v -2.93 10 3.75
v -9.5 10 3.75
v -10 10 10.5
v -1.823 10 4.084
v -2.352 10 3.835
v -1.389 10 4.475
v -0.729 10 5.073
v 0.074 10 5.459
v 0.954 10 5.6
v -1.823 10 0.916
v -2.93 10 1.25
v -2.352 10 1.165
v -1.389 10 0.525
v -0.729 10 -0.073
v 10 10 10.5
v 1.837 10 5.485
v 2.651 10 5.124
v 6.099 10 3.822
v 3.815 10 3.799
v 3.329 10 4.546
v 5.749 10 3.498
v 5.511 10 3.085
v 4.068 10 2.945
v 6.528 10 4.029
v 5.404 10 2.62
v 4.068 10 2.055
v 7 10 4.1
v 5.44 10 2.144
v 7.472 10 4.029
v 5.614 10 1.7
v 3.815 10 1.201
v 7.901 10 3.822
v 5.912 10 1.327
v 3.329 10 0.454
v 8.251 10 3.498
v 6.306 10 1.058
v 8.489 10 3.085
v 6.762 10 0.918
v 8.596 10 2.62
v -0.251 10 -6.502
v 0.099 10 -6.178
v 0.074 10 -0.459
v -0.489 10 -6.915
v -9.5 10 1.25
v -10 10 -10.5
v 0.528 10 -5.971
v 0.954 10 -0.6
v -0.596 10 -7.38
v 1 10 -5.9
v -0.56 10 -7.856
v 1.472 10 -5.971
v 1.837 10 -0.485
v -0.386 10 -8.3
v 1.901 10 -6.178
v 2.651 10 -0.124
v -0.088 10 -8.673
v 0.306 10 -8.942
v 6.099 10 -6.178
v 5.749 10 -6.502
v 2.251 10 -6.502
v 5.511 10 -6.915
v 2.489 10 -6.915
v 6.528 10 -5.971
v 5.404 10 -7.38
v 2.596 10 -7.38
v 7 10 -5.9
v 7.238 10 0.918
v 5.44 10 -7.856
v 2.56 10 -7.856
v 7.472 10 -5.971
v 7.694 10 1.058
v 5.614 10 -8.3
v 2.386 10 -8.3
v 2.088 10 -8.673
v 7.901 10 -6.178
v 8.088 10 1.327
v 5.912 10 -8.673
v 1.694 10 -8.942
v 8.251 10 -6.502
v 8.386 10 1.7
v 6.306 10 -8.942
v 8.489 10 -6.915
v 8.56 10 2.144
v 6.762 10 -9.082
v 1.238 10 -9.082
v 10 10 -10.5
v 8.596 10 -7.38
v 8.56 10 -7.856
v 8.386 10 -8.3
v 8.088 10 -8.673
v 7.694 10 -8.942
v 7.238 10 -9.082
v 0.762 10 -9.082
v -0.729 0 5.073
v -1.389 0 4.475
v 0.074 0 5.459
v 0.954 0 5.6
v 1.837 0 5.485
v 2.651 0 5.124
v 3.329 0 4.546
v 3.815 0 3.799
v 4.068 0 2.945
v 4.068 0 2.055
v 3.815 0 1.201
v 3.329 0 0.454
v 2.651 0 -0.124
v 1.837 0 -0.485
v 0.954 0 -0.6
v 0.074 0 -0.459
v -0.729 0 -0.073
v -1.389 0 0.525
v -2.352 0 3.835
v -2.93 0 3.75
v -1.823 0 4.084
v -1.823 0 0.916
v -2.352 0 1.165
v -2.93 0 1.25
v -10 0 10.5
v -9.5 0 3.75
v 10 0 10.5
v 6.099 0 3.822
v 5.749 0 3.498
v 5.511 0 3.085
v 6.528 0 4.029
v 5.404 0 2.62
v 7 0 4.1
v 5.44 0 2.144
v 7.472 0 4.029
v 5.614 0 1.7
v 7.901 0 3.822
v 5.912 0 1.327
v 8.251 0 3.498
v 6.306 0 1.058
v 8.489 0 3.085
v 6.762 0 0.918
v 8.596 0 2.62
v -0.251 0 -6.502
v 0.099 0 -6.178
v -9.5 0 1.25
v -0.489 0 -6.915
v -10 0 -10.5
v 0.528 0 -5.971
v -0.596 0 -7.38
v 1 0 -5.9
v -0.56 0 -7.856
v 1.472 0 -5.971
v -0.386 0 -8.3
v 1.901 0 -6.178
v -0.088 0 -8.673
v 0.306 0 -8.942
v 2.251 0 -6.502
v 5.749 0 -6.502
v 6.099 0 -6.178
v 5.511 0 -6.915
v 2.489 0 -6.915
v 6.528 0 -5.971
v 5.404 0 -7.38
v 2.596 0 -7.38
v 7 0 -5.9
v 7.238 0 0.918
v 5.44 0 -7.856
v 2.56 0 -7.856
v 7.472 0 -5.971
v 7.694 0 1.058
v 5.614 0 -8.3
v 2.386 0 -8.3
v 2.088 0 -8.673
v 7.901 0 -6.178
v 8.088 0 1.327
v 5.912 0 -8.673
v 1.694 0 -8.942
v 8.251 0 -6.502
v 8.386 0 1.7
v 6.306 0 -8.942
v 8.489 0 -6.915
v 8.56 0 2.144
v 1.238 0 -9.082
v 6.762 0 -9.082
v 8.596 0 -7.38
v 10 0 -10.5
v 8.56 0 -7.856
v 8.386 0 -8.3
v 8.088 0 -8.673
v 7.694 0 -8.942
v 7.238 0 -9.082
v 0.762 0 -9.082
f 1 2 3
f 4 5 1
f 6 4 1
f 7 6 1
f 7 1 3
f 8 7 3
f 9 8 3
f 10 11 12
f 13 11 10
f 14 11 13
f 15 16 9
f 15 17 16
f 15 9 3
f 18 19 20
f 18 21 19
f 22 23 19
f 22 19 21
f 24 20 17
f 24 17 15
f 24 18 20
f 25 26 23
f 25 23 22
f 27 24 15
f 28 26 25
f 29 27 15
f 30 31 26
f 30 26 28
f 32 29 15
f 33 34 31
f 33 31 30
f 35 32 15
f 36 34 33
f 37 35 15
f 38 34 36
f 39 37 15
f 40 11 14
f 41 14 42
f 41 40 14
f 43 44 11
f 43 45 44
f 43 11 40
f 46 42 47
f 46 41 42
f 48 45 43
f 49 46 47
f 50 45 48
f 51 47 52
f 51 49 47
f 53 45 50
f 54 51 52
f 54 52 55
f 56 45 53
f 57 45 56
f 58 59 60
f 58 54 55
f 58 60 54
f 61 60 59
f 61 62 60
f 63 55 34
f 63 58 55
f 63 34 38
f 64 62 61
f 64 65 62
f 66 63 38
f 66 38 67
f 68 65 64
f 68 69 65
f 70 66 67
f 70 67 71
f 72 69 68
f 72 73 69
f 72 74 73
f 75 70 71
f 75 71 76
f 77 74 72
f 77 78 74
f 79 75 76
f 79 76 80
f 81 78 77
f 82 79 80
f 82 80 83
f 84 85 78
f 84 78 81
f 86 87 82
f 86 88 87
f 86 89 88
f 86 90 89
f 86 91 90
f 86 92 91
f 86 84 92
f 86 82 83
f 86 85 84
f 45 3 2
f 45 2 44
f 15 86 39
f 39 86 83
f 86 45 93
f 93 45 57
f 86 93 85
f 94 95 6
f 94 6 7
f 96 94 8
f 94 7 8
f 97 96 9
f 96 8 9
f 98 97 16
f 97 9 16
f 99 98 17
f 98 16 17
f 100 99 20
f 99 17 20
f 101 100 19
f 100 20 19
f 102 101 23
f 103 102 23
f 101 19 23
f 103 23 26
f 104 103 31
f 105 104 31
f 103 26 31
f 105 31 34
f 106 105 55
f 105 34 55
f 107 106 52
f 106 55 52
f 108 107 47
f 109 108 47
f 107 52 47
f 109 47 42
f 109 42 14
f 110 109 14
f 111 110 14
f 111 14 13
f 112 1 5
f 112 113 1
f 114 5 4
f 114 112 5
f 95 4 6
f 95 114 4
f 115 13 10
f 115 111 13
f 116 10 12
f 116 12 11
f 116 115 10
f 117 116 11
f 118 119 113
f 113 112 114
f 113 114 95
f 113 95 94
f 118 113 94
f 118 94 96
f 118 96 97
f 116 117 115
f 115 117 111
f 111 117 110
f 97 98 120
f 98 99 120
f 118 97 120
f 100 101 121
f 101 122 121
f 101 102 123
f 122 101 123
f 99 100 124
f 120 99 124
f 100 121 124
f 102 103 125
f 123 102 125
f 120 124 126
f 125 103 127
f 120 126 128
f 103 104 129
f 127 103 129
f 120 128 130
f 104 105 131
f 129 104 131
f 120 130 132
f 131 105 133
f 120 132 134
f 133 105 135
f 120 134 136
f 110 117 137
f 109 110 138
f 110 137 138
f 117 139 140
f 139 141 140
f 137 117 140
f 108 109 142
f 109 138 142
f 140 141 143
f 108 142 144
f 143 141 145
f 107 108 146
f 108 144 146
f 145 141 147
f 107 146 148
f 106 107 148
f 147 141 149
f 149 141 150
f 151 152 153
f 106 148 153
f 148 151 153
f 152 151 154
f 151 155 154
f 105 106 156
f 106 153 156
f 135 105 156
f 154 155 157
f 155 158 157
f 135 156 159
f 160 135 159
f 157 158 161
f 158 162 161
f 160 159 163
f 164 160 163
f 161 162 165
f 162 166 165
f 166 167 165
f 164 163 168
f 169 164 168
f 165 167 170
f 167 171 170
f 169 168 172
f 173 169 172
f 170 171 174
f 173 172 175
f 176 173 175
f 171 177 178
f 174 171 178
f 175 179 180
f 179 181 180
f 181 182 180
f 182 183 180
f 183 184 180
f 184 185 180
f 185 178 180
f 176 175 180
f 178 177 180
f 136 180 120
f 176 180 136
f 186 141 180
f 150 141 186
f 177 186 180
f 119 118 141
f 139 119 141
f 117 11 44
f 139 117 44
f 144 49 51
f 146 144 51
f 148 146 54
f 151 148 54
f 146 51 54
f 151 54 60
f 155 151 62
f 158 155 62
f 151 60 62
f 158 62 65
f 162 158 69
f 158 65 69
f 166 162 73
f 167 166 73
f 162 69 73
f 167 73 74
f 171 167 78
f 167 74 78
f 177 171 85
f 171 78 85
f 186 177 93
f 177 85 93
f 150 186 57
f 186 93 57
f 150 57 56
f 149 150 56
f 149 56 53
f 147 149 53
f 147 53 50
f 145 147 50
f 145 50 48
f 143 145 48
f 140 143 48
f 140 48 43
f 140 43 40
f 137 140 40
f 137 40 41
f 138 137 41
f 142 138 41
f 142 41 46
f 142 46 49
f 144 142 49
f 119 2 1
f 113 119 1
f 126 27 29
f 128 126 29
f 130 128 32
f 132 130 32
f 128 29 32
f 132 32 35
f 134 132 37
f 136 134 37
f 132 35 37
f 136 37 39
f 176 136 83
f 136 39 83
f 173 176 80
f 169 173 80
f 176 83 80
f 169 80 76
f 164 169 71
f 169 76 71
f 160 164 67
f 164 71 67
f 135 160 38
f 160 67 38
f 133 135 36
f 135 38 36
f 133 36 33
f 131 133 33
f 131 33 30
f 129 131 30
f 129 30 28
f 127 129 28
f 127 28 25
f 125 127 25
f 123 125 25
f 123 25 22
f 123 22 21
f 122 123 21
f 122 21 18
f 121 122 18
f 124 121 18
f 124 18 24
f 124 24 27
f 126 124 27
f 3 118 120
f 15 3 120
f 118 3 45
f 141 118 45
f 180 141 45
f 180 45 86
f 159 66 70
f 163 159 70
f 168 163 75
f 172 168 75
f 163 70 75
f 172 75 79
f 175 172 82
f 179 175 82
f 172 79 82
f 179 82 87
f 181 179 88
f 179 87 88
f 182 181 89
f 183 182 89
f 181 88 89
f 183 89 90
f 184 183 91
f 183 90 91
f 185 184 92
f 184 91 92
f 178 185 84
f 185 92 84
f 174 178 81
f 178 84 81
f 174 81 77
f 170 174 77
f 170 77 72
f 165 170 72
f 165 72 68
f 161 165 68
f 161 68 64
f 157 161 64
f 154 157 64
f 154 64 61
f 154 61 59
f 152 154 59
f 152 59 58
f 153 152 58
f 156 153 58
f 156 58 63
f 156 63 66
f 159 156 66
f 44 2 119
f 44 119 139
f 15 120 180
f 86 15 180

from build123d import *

# Parameters (mm, degrees)
SKETCH_1_W          = 20
SKETCH_1_H          = 21
EXTRUDE_1_DEPTH     = 10
CUT_EXTRUDE_1_DEPTH = 18.613914954
FILLET_2_R          = 2
SKETCH_3_R          = 1.6
CUT_EXTRUDE_2_DEPTH = 18.613914954
SKETCH_4_W          = 0.5
SKETCH_4_H          = 2.5
EXTRUDE_2_DEPTH     = 10


with BuildPart() as part:
    # 草图1 → 凸台-拉伸1 (new body)
    with BuildSketch(Plane(origin=(0, 0, 0), x_dir=(1, 0, 0), z_dir=(0, 1, 0))):
        Rectangle(SKETCH_1_W, SKETCH_1_H)
    extrude(amount=EXTRUDE_1_DEPTH)

    # 草图2 → 切除-拉伸1 (cut, through all)
    with BuildSketch(Plane(origin=(0, 10, 0), x_dir=(1, 0, 0), z_dir=(0, 1, 0))):
        with BuildLine():
            Line((-1.836811591, -1.25), (-10, -1.25))
            Line((-10, -1.25), (-10, -3.75))
            Line((-10, -3.75), (-1.836811591, -3.75))
            ThreePointArc((-1.836811591, -3.75), (4.1, -2.5), (-1.836811591, -1.25))
        make_face()
    extrude(amount=-CUT_EXTRUDE_1_DEPTH, mode=Mode.SUBTRACT)

    # 圆角2
    fillet_2_edges = [part.edges().sort_by_distance(p)[0] for p in [
        (-1.836811591, 5, 1.25),
        (-1.836811591, 5, 3.75),
    ]]
    fillet(fillet_2_edges, radius=FILLET_2_R)

    # 草图3 → 切除-拉伸2 (cut, through all)
    with BuildSketch(Plane(origin=(0, 10, 0), x_dir=(1, 0, 0), z_dir=(0, 1, 0))):
        with Locations(Location((1, 7.5, 0), (0, 0, 270))):
            Circle(SKETCH_3_R)
        with Locations(Location((7, 7.5, 0), (0, 0, 270))):
            Circle(SKETCH_3_R)
        with Locations(Location((7, -2.5, 0), (0, 0, 270))):
            Circle(SKETCH_3_R)
    extrude(amount=-CUT_EXTRUDE_2_DEPTH, mode=Mode.SUBTRACT)

    # 草图4 → 凸台-拉伸2 (add)
    with BuildSketch(Plane(origin=(0, 10, 0), x_dir=(1, 0, 0), z_dir=(0, 1, 0))):
        with Locations((-9.75, -2.5)):
            Rectangle(SKETCH_4_W, SKETCH_4_H)
    extrude(amount=-EXTRUDE_2_DEPTH)


solid = part.part
